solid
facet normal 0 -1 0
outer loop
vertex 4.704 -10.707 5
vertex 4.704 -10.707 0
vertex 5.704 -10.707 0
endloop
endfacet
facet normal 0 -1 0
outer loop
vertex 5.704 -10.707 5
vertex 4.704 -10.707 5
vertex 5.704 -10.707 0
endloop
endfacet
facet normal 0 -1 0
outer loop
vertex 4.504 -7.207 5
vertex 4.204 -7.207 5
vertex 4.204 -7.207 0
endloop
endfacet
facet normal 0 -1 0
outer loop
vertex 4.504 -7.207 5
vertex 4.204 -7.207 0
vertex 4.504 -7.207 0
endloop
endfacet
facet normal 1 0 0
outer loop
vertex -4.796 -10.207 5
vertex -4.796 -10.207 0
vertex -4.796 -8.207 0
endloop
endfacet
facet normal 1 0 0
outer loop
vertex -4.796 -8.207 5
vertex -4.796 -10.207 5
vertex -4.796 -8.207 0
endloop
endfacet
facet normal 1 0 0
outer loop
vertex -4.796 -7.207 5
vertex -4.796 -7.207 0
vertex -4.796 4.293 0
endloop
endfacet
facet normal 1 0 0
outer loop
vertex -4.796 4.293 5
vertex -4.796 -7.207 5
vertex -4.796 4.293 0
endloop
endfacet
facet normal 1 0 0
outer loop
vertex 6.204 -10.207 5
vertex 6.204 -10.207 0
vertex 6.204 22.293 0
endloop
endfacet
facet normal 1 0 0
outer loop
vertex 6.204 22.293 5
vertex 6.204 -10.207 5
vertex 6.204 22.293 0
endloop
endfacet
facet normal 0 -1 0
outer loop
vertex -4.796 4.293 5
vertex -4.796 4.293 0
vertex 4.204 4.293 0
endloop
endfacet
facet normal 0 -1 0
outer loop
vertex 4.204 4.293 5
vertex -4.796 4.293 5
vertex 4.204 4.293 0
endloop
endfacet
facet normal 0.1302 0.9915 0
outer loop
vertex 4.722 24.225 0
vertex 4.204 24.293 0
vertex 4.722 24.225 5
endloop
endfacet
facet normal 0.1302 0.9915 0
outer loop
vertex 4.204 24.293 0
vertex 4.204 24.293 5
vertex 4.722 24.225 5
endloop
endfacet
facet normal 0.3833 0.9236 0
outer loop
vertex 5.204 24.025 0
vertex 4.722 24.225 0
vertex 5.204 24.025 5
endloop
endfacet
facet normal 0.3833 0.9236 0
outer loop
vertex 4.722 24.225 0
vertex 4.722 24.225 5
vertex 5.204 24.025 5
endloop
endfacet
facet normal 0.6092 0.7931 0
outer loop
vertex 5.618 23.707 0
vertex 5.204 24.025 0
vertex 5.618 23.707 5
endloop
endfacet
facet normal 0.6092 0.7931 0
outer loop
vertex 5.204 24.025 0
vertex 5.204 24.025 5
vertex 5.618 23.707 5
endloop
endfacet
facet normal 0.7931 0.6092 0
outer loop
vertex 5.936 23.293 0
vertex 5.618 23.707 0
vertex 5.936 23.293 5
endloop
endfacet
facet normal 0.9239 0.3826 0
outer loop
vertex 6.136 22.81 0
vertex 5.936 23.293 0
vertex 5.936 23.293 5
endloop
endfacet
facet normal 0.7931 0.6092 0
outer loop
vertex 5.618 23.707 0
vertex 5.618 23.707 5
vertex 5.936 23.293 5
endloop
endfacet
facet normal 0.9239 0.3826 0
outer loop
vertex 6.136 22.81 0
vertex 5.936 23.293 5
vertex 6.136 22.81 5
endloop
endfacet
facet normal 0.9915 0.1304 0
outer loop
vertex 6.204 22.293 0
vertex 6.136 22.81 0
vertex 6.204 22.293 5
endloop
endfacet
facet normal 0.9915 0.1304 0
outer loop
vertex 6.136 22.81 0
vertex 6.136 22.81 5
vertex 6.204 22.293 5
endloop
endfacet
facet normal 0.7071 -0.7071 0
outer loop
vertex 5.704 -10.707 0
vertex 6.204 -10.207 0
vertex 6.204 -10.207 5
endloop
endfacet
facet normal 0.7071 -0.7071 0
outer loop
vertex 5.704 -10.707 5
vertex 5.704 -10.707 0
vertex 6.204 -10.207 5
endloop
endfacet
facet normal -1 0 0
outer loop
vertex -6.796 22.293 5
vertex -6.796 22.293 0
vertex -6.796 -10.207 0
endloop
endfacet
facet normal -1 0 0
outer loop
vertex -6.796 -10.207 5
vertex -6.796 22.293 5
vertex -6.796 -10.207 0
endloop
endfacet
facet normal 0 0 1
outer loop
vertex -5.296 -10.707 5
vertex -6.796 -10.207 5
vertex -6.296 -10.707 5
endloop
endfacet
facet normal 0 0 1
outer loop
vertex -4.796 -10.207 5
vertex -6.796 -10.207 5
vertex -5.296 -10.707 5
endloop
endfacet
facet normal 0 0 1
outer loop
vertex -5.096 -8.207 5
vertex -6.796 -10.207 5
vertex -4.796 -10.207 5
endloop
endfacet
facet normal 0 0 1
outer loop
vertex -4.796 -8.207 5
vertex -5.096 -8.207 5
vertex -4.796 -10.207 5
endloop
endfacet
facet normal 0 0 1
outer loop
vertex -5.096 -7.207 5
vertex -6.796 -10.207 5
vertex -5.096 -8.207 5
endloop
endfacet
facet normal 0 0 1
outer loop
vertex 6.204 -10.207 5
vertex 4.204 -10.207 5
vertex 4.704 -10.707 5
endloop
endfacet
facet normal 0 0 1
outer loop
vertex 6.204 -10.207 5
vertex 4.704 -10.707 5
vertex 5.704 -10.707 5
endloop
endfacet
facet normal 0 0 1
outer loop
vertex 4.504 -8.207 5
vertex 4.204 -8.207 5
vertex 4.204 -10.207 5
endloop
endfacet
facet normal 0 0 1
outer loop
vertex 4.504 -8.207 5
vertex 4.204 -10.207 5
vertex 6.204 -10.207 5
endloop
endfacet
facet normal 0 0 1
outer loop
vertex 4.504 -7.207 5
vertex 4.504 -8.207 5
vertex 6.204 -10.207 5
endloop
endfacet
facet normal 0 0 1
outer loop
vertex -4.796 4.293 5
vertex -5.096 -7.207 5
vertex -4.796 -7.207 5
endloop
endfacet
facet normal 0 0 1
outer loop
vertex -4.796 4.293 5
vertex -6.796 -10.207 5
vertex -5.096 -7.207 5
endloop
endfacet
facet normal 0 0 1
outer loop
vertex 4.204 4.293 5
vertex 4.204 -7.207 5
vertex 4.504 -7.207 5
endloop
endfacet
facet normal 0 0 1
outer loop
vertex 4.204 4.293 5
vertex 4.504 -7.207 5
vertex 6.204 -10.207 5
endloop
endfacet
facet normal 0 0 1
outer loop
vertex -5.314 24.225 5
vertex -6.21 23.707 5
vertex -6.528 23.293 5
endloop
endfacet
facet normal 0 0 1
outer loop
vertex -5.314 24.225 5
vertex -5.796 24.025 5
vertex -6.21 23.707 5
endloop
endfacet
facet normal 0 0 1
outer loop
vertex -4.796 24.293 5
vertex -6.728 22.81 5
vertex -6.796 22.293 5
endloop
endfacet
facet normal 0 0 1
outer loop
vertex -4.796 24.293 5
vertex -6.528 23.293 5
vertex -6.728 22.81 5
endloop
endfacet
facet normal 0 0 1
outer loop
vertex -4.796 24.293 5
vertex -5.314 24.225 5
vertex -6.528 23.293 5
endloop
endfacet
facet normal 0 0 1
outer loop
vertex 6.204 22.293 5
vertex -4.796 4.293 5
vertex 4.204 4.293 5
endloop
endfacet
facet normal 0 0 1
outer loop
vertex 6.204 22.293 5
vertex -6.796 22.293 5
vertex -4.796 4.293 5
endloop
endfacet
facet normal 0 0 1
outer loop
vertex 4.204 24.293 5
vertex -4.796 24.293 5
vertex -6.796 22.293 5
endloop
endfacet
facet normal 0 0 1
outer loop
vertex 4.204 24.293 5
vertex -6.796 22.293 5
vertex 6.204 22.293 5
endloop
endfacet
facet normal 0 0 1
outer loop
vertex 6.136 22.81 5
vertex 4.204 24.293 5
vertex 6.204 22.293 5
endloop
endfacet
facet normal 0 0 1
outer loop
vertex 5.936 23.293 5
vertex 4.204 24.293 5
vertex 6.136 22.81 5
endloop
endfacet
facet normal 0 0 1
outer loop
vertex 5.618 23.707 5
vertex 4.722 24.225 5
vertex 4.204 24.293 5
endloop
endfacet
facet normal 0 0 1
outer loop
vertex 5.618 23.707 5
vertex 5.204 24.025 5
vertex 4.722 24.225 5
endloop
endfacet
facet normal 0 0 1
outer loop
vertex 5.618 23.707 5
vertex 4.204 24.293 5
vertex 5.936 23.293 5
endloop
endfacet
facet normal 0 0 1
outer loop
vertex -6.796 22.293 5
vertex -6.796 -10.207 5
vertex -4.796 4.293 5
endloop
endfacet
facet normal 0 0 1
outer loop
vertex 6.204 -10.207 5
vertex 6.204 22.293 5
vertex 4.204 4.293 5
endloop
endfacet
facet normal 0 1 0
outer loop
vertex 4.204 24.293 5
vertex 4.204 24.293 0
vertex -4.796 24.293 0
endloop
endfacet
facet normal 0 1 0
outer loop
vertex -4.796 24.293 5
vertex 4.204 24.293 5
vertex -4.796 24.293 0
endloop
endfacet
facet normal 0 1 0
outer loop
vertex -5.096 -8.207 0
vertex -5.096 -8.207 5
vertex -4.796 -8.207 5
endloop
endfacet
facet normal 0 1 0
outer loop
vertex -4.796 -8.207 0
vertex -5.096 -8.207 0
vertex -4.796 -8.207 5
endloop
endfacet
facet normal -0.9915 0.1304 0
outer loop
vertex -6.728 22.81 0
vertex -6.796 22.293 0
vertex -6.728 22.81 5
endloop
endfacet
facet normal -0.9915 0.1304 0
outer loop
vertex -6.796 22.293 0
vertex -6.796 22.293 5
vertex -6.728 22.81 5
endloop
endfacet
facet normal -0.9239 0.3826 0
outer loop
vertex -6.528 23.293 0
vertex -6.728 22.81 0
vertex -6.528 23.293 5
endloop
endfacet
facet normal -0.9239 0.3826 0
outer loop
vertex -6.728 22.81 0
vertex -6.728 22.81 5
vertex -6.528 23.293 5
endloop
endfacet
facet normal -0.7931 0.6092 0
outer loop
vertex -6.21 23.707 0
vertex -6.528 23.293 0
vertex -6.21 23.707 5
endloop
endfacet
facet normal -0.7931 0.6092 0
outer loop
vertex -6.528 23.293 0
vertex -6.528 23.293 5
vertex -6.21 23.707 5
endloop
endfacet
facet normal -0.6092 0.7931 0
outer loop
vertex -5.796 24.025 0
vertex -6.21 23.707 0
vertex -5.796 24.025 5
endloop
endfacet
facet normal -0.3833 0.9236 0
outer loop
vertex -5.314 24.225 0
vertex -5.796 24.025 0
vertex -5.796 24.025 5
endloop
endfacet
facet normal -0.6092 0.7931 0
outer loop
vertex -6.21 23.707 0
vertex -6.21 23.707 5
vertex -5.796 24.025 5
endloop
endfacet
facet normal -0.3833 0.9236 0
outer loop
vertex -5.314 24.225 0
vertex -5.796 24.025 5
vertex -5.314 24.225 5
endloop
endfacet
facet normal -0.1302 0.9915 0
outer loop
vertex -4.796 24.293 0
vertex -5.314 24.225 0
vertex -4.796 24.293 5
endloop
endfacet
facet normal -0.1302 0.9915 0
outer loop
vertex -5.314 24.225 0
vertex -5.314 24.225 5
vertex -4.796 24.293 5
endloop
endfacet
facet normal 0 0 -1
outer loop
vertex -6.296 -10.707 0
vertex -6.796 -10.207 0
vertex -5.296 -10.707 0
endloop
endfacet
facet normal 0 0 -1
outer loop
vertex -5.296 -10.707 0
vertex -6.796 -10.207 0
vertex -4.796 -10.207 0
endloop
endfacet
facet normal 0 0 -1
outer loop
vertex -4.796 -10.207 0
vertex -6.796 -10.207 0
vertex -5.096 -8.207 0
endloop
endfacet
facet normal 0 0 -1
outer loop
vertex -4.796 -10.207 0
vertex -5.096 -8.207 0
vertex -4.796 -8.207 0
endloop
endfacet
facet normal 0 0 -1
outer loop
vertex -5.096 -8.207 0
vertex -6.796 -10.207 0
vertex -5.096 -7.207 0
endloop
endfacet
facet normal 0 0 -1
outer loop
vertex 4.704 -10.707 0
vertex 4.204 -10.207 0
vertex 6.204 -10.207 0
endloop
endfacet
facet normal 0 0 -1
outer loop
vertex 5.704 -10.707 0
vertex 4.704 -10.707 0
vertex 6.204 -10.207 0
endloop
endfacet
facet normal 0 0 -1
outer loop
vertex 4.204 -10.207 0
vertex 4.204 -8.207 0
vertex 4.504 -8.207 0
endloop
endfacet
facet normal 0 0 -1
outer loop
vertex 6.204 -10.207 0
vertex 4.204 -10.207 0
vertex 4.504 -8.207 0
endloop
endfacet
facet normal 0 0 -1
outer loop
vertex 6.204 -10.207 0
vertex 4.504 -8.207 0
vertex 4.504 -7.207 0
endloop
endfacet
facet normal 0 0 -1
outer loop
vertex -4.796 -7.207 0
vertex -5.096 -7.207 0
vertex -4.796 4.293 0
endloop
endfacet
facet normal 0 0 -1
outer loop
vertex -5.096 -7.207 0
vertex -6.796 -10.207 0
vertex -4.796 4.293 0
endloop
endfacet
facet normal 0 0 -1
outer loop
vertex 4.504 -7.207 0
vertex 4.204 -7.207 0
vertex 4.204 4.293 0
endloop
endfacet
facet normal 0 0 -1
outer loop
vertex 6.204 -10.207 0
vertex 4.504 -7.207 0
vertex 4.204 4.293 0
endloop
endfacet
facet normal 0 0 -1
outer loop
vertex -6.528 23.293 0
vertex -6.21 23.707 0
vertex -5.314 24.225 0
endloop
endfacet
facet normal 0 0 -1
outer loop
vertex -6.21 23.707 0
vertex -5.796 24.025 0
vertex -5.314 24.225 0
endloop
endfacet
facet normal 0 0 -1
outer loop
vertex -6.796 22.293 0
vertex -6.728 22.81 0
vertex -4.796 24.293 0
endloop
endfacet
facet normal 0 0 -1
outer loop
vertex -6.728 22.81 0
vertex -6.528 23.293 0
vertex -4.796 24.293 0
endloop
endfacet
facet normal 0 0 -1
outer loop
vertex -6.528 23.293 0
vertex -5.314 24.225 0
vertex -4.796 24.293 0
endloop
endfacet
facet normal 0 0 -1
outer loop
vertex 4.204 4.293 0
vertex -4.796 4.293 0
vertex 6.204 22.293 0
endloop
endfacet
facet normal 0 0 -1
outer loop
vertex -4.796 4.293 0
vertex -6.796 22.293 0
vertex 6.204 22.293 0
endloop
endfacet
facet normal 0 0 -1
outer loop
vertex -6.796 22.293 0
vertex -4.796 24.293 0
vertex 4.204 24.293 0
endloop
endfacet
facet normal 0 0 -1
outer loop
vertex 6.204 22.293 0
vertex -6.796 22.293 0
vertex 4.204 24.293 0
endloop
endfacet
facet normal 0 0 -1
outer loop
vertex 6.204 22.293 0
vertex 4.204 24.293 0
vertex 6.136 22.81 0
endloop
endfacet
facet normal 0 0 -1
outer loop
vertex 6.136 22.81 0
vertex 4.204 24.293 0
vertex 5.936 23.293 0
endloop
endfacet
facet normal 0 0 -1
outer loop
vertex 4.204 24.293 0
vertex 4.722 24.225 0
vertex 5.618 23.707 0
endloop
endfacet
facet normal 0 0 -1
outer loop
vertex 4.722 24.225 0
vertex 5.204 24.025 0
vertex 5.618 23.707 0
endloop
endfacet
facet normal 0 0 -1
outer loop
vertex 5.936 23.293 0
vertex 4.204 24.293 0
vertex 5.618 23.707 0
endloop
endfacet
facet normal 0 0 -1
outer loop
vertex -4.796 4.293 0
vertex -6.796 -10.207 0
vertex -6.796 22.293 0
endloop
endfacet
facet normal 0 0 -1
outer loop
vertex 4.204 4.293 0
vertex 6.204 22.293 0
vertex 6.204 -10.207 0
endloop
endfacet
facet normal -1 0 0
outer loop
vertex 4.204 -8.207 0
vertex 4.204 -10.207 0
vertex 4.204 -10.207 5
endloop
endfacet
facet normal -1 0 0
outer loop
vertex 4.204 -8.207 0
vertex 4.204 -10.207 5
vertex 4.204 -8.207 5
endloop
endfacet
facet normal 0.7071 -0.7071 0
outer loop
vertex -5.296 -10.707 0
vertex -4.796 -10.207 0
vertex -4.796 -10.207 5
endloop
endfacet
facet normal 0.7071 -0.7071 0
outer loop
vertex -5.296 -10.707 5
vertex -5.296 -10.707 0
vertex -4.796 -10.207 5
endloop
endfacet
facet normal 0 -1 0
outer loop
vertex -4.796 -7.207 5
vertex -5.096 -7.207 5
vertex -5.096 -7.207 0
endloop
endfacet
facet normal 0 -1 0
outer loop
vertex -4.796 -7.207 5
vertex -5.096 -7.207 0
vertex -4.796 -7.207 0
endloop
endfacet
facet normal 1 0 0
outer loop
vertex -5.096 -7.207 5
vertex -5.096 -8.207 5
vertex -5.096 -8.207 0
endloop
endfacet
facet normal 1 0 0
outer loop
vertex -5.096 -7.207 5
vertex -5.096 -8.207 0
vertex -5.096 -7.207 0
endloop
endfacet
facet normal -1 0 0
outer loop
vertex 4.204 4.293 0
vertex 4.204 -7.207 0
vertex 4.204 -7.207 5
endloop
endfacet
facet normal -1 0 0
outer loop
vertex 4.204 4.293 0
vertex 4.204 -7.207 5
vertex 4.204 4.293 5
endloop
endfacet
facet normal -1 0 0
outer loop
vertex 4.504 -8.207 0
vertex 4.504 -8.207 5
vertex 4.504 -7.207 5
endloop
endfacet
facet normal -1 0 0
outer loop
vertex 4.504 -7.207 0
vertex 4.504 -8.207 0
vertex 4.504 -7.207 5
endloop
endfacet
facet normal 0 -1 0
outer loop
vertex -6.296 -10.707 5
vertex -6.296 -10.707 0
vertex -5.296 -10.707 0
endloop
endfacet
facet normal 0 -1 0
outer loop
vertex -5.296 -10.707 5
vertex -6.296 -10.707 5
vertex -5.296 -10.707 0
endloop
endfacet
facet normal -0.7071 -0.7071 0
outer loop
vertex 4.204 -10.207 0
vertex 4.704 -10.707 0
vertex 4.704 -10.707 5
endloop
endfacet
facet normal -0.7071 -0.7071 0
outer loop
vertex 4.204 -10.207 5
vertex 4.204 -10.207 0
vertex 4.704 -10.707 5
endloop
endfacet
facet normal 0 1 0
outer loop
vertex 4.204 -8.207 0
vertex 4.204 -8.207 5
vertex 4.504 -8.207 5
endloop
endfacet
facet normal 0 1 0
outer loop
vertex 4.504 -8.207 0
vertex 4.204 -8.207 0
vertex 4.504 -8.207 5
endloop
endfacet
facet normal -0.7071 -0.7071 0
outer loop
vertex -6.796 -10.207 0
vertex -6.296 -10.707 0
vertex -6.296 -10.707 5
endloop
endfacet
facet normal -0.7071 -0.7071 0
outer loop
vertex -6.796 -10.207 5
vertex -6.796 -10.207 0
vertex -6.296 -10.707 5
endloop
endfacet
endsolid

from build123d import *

# Parameters (mm, degrees)
F0_W     = 2
F0_H     = 15
F1_DEPTH = 5
F2_SIZE  = 0.5
F3_W     = 0.3
F3_H     = 1
F4_DEPTH = 25
F5_R     = 2


with BuildPart() as f1:
    # F0 (on Top) → F1 (new body)
    with BuildSketch(Plane.XY):
        Polygon((6.203948, 24.292763), (-6.796052, 24.292763), (-6.796052, 4.292763), (-4.796052, 4.292763), (4.203948, 4.292763), (6.203948, 4.292763), align=None)
        with Locations((-5.796052, -3.207237)):
            Rectangle(F0_W, F0_H)
        with Locations((5.203948, -3.207237)):
            Rectangle(F0_W, F0_H)
    extrude(amount=F1_DEPTH)

    # F2
    f2_edges = [f1.edges().sort_by_distance(p)[0] for p in [
        (-6.796052, -10.707237, 2.5),
        (4.203948, -10.707237, 2.5),
        (6.203948, -10.707237, 2.5),
        (-4.796052, -10.707237, 2.5),
    ]]
    chamfer(f2_edges, length=F2_SIZE)

    # F3 (on face) → F4 (cut)
    with BuildSketch(Plane.XY.offset(5)):
        with Locations((-4.946052, -7.707237)):
            Rectangle(F3_W, F3_H)
        with Locations((4.353948, -7.707237)):
            Rectangle(F3_W, F3_H)
    extrude(amount=-F4_DEPTH, mode=Mode.SUBTRACT)

    # F5
    f5_edges = [f1.edges().sort_by_distance(p)[0] for p in [
        (6.203948, 24.292763, 2.5),
        (-6.796052, 24.292763, 2.5),
    ]]
    fillet(f5_edges, radius=F5_R)


solid = f1.part
